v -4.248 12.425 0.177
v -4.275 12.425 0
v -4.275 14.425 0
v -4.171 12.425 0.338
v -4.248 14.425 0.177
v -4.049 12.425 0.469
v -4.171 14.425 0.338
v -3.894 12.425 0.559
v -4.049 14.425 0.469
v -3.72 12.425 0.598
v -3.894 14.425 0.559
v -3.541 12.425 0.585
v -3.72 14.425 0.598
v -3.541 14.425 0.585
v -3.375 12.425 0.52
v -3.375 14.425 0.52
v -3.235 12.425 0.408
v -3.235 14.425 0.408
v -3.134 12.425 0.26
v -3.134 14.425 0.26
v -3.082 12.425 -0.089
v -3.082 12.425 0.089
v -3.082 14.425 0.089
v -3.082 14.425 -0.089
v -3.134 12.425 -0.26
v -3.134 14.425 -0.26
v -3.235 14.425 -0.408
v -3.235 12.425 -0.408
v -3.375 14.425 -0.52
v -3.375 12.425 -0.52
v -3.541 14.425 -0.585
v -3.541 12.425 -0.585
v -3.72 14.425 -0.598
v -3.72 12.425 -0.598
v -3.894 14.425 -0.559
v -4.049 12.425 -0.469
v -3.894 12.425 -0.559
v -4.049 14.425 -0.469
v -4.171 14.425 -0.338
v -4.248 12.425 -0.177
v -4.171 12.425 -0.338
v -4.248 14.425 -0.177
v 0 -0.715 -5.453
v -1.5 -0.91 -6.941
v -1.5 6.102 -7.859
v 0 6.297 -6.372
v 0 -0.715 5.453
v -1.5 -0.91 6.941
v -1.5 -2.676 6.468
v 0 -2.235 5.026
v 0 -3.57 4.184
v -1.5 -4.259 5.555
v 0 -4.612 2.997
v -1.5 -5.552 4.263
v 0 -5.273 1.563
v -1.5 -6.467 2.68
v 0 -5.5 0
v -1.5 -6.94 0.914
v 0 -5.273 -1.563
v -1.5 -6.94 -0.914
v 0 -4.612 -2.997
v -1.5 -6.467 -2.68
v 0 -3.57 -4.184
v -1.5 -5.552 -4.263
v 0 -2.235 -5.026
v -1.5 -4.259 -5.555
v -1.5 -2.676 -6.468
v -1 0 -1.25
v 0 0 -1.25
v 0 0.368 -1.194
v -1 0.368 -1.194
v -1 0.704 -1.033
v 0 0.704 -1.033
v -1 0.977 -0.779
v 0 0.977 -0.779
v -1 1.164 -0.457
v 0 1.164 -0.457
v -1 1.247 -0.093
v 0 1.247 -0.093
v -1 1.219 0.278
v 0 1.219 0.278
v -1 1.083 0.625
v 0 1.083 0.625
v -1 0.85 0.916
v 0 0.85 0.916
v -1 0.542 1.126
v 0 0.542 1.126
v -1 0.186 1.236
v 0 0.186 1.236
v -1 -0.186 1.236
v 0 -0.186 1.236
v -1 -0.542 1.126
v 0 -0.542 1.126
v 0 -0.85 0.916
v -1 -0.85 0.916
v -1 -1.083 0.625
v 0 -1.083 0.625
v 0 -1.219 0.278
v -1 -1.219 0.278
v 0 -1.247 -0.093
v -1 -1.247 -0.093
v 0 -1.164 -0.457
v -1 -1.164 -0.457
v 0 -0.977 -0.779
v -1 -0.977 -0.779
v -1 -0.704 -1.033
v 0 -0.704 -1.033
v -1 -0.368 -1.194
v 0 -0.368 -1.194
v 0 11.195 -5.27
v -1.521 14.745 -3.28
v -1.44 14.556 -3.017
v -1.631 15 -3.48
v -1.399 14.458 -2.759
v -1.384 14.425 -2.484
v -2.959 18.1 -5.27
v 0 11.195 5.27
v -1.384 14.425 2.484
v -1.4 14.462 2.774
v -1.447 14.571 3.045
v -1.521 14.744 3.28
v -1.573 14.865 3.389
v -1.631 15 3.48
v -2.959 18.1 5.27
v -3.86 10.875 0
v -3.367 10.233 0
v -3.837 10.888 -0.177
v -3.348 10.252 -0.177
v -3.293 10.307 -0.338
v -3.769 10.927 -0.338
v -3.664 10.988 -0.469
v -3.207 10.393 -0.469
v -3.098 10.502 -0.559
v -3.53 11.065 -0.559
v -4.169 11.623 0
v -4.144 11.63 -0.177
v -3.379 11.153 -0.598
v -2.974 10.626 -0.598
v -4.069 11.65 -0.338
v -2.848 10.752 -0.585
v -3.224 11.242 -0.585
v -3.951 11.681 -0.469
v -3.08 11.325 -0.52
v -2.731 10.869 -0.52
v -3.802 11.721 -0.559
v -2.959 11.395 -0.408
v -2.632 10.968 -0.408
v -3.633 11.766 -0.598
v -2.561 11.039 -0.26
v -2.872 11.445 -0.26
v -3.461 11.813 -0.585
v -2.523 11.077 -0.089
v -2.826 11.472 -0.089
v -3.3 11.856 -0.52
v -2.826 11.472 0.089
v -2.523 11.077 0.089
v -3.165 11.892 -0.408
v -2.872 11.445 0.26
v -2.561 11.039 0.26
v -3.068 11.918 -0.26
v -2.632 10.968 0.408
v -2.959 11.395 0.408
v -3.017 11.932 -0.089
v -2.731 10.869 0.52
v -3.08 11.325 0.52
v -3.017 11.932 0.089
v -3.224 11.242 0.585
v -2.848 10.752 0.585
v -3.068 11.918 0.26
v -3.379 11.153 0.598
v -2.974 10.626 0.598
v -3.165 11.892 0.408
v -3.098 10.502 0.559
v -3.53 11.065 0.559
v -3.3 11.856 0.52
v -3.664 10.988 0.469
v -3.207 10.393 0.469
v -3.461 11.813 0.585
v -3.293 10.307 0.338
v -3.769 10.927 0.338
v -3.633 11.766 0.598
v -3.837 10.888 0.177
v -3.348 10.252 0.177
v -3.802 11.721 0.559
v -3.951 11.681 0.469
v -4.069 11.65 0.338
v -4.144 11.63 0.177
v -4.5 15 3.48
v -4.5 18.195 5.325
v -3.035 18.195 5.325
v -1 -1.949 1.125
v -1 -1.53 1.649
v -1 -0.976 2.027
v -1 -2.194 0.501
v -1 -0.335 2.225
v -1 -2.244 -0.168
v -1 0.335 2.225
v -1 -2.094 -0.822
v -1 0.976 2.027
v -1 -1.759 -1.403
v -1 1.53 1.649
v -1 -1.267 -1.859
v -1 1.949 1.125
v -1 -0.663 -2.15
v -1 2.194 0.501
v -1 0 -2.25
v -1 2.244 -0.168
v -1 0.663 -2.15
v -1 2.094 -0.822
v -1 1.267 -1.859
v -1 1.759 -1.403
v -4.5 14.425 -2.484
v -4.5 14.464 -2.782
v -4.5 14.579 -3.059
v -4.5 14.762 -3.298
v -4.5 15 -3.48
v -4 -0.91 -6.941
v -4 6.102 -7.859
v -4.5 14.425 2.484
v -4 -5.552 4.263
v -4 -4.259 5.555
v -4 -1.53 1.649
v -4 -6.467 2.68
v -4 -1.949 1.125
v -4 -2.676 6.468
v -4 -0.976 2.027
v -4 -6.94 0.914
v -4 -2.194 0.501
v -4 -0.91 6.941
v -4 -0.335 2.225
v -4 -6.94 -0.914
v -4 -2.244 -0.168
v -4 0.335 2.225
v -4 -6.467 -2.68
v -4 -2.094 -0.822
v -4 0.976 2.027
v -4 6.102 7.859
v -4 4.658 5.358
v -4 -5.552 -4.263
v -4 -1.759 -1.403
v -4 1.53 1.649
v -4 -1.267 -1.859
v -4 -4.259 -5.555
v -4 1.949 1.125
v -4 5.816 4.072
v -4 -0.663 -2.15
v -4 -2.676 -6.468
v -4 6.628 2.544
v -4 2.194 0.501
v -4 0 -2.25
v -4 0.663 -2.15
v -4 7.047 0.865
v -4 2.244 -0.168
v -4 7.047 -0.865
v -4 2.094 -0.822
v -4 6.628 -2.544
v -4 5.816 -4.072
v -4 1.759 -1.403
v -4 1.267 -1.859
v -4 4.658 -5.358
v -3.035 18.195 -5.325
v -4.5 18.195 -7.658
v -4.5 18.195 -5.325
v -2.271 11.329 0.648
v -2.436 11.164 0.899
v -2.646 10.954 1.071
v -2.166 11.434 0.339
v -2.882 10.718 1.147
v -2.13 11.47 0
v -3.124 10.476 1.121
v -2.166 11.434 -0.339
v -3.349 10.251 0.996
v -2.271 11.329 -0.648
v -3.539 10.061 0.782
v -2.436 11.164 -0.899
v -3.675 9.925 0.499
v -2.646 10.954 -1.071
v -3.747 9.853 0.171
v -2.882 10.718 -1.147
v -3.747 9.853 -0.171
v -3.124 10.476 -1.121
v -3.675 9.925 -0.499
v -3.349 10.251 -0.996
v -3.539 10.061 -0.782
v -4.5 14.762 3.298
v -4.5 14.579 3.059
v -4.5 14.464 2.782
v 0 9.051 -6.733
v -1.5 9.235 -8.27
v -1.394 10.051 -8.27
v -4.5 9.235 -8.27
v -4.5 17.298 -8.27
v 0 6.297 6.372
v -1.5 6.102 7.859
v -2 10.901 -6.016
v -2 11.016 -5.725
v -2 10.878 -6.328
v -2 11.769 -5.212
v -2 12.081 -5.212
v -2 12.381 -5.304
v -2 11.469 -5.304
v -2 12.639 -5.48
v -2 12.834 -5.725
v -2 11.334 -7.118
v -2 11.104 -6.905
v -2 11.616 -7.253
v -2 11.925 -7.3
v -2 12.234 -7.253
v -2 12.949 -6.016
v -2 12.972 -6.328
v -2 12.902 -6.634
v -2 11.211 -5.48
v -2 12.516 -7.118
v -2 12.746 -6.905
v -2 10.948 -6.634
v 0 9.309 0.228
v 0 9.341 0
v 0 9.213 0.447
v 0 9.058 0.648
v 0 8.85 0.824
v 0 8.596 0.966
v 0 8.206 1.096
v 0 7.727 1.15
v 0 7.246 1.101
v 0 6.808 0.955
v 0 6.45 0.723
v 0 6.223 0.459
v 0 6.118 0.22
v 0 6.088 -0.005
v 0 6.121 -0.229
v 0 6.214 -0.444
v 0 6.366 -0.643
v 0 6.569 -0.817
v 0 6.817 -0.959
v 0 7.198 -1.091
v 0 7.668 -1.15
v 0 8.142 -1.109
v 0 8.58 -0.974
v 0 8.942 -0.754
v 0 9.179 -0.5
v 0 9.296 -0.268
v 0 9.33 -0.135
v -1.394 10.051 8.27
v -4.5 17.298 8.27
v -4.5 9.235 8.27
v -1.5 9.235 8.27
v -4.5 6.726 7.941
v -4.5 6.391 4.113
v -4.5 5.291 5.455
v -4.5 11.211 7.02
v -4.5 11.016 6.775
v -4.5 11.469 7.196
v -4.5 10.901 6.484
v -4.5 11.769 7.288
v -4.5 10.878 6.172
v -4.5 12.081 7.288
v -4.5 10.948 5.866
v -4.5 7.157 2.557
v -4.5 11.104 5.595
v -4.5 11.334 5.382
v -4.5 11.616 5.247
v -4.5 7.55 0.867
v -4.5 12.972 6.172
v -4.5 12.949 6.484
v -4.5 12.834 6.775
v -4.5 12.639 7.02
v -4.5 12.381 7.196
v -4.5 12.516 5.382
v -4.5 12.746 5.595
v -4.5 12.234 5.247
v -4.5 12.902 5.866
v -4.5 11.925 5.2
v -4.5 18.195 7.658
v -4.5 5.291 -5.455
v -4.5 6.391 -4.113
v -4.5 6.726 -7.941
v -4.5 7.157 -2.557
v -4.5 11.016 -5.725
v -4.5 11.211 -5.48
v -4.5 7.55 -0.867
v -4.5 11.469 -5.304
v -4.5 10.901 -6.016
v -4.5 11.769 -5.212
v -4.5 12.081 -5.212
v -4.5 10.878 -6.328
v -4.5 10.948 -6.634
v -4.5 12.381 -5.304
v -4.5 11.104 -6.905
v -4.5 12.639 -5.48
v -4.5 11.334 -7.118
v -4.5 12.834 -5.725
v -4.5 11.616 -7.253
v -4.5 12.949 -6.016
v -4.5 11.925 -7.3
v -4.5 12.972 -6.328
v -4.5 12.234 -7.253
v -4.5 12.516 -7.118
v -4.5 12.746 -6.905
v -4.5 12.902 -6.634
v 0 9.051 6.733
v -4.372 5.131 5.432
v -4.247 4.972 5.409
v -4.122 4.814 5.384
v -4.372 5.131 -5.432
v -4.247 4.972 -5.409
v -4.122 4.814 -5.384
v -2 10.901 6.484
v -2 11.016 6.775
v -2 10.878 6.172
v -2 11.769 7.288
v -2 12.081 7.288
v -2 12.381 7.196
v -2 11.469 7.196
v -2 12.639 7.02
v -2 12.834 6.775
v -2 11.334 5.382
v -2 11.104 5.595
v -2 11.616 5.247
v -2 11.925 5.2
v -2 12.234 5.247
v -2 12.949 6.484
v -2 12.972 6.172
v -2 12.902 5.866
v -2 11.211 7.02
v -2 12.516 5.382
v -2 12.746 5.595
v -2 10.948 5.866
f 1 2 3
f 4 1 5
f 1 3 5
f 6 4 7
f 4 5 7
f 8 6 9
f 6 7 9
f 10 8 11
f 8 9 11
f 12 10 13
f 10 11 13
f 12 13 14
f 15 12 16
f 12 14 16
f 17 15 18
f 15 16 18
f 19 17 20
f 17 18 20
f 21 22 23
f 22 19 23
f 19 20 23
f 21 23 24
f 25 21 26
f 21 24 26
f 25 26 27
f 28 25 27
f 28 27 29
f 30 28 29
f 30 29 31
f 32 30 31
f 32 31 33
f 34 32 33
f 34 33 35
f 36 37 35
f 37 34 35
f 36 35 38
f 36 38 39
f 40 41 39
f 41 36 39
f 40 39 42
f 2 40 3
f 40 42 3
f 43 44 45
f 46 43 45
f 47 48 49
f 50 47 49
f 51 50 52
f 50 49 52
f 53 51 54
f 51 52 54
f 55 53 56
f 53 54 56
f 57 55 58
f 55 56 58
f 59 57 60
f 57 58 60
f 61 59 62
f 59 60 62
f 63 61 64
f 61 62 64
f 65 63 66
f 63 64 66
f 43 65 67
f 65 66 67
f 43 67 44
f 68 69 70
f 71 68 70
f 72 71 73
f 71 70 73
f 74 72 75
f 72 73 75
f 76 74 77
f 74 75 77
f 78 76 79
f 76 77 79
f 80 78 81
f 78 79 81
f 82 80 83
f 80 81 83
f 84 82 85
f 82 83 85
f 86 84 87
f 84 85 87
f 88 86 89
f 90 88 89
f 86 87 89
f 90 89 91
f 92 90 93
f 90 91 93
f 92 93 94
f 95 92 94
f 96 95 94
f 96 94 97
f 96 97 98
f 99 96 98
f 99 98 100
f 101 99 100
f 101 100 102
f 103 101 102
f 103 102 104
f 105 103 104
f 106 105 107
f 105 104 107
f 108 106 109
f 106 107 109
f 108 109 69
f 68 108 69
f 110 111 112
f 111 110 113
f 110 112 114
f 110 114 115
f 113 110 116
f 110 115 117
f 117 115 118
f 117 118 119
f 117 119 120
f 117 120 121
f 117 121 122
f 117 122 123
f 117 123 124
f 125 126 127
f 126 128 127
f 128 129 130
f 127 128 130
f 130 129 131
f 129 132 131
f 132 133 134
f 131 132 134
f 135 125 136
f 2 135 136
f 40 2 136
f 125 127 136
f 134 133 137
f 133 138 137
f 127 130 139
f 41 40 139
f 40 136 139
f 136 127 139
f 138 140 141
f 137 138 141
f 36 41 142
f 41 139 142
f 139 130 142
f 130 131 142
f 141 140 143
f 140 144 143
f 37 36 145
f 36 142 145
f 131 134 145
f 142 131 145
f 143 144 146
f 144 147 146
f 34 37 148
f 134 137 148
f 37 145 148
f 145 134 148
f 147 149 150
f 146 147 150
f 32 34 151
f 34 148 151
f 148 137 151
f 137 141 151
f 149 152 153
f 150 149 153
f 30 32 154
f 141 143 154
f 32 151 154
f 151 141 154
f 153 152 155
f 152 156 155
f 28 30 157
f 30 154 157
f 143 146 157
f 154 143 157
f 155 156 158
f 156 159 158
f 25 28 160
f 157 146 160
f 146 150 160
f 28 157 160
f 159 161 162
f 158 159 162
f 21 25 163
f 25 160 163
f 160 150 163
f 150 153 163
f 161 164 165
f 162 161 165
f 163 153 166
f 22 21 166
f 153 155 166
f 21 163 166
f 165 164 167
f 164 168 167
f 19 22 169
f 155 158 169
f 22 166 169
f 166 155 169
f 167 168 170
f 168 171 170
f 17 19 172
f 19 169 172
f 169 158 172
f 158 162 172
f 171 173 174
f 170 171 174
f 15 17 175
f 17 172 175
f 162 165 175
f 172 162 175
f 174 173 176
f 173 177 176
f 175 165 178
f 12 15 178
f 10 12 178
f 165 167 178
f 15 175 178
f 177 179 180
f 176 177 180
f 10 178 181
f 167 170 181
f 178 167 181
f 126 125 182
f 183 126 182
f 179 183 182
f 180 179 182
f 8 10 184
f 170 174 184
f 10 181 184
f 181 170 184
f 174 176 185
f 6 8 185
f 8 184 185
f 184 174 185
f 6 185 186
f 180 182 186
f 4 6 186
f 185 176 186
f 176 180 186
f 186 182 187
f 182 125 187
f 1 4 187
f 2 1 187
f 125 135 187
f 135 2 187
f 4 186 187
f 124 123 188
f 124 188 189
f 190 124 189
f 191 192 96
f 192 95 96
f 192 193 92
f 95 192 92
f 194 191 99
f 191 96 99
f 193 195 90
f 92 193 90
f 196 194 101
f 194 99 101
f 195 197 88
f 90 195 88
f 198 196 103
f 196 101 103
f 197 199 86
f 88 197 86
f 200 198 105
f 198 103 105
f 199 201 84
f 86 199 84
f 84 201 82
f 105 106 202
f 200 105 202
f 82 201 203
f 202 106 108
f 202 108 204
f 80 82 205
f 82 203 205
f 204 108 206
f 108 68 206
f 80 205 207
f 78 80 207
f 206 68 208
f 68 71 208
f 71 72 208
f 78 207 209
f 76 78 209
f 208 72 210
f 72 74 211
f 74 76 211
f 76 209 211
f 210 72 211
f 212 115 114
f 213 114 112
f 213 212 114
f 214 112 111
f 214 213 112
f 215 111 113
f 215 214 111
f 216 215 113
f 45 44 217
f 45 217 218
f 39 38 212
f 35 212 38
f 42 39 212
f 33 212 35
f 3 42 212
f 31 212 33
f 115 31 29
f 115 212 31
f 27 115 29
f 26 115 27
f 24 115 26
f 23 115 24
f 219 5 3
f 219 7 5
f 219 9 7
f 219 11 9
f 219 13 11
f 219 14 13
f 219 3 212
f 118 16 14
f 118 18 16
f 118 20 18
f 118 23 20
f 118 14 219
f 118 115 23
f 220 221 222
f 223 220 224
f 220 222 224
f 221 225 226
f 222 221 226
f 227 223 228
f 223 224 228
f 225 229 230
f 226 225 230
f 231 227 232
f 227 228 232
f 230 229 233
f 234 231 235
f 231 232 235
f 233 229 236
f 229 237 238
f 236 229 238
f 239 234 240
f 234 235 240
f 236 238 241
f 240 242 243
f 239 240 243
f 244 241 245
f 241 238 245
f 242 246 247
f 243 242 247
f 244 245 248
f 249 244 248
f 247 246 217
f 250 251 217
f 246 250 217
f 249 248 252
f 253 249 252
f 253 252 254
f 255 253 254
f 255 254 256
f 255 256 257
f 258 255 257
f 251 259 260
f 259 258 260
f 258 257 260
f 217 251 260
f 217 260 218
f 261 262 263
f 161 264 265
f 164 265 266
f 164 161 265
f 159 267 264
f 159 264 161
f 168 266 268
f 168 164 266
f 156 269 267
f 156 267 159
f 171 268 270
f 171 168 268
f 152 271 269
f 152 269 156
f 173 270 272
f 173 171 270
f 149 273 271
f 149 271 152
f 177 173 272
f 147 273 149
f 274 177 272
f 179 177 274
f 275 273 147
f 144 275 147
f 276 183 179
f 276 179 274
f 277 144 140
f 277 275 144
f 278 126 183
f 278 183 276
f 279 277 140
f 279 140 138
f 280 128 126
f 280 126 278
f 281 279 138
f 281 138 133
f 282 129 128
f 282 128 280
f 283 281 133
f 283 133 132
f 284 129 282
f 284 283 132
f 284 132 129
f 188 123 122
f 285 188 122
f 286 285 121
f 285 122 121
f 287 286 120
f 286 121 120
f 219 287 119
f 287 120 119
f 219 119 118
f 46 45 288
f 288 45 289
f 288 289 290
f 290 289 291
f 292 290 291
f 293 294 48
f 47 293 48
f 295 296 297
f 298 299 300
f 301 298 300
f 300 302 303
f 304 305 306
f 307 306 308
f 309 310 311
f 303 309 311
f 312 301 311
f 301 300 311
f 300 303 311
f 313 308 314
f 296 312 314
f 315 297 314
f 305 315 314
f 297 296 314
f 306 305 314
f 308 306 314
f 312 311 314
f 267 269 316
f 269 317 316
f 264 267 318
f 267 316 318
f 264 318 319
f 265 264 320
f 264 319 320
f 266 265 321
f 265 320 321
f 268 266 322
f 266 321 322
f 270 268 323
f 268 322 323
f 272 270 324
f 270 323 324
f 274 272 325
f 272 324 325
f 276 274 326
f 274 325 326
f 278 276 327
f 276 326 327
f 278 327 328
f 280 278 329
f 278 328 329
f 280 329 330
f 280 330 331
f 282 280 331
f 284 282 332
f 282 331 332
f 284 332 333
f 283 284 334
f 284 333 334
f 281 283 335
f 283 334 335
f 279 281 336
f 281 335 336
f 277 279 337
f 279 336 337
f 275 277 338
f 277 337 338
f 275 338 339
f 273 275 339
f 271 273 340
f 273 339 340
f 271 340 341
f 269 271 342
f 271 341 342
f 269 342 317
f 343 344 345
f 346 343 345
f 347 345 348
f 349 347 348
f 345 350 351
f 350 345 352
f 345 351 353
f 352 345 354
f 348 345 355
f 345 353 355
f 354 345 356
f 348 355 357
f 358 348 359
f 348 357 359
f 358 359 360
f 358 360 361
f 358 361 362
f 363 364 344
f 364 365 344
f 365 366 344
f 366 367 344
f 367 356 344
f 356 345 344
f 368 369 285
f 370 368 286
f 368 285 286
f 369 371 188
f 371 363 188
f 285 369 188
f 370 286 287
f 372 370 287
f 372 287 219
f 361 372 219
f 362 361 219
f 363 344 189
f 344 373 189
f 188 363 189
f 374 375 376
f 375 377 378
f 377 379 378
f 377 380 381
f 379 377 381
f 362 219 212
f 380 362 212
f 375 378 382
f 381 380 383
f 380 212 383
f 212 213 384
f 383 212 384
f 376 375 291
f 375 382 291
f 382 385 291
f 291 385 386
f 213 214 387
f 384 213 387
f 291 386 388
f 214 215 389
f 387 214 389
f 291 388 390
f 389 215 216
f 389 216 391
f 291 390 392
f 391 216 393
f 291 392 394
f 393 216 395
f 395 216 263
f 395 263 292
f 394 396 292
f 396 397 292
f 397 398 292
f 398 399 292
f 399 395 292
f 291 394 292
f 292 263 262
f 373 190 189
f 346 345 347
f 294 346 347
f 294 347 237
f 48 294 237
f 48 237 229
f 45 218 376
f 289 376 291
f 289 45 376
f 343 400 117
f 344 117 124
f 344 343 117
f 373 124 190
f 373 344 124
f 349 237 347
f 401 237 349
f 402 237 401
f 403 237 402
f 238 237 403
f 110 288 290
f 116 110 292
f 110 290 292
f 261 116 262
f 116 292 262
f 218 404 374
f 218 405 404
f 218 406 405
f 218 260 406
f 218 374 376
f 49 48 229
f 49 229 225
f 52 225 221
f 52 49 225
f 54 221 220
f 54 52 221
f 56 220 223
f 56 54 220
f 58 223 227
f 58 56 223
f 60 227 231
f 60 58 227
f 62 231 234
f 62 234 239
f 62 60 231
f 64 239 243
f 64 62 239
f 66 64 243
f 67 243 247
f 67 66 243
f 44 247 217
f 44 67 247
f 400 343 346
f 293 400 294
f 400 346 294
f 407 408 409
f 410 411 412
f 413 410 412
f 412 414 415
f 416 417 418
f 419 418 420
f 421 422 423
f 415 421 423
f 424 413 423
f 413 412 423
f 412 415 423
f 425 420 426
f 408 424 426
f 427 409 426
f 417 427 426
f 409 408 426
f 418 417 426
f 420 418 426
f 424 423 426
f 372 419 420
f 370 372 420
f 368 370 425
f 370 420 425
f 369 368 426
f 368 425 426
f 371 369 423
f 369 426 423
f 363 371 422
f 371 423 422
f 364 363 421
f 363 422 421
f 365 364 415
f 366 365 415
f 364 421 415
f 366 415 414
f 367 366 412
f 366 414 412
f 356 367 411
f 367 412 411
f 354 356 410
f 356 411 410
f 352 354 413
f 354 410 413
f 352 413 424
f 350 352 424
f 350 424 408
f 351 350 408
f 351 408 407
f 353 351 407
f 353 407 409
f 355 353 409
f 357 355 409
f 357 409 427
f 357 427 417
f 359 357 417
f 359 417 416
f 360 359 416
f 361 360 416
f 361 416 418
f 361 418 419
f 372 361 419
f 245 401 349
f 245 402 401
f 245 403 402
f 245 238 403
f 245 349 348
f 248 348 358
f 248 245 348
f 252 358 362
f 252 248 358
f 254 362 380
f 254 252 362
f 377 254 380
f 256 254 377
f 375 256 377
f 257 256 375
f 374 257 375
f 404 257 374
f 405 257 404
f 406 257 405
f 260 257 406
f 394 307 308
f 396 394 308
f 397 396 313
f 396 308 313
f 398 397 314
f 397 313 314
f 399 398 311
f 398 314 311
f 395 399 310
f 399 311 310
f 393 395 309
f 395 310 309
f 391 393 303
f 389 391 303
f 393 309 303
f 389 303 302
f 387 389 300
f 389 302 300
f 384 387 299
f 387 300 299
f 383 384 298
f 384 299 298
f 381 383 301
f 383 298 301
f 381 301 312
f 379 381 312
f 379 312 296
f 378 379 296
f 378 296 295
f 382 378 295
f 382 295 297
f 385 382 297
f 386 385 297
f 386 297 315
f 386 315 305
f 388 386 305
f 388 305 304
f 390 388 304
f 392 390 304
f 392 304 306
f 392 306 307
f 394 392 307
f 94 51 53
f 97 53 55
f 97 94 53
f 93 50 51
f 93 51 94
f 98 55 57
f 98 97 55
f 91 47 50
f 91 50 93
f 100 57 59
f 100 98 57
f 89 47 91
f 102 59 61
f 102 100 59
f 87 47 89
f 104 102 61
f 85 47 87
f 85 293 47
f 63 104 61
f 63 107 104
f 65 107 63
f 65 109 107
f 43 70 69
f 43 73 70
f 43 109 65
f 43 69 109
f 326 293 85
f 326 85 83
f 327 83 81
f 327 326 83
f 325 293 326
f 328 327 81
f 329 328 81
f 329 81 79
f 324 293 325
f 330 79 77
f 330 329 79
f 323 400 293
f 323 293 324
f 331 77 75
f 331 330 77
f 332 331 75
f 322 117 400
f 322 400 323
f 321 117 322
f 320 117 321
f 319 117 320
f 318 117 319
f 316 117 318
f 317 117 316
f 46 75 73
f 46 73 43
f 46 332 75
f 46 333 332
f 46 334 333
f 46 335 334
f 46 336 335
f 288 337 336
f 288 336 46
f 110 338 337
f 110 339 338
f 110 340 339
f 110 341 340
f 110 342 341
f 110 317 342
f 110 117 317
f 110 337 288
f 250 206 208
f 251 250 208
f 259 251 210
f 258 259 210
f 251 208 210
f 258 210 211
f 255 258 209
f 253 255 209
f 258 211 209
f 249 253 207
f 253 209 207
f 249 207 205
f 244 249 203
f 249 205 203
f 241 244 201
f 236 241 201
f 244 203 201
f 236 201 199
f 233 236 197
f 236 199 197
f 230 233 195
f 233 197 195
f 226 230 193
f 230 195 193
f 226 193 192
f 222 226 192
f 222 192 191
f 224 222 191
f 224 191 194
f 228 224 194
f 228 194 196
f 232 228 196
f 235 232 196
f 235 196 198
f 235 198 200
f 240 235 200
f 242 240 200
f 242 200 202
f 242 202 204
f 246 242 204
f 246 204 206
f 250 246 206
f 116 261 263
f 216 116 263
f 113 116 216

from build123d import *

# Parameters (mm, degrees)
BOSS_EXTRUDE4_DEPTH  = 4.5
SKETCH1_R            = 2.25
BOSS_EXTRUDE1_DEPTH  = 4
SKETCH1_4_R          = 2.25
SKETCH1_4_R_2        = 1.25
BOSS_EXTRUDE2_DEPTH  = 1
CHAMFER1_SIZE        = 3
CHAMFER1_SIZE_2      = 5.196152423
FILLET1_R            = 1.15
CHAMFER2_SIZE        = 7
CHAMFER2_SIZE2       = 3
CHAMFER3_SIZE        = 3
CHAMFER3_SIZE2       = 1.732050808
CHAMFER4_SIZE        = 1.5
CUT_EXTRUDE1_START   = -2
SKETCH1_6_R          = 1.05
CUT_EXTRUDE1_DEPTH   = 19.48660355
CUT_SWEEP1_PROFILE_R = 0.6
CUT_SWEEP2_PROFILE_R = 1.15
CHAMFER5_SIZE        = 0.5


# Some blends are built 0.0001 mm under size
with BuildPart() as part:
    # Sketch1<7> → Boss-Extrude4 (new body)
    with BuildSketch(Plane(origin=(0, 0, 0), x_dir=(0, 0, -1), z_dir=(1, 0, 0))):
        with BuildLine():
            Line((8.27, 9.234757272), (8.27, 18.195))
            Line((8.27, 18.195), (2.325, 18.195))
            Line((2.325, 18.195), (2.325, 14.425))
            Line((2.325, 14.425), (-2.325, 14.425))
            Line((-2.325, 14.425), (-2.325, 18.195))
            Line((-2.325, 18.195), (-8.27, 18.195))
            Line((-8.27, 18.195), (-8.27, 9.234757272))
            Line((-8.27, 9.234757272), (-7.859471067, 6.101983066))
            Line((-7.859471067, 6.101983066), (-5.358442733, 4.658013684))
            ThreePointArc((-5.358442733, 4.658013684), (0, 7.1), (5.358442733, 4.658013684))
            Line((5.358442733, 4.658013684), (7.859471067, 6.101983066))
            Line((7.859471067, 6.101983066), (8.27, 9.234757272))
        make_face()
    extrude(amount=-BOSS_EXTRUDE4_DEPTH)

    # Sketch1 → Boss-Extrude1 (add)
    with BuildSketch(Plane(origin=(0, 0, 0), x_dir=(0, 0, -1), z_dir=(1, 0, 0))):
        with BuildLine():
            Line((6.940659998, -0.909526687), (7.859471067, 6.101983066))
            Line((7.859471067, 6.101983066), (5.358442733, 4.658013684))
            ThreePointArc((5.358442733, 4.658013684), (0, 7.1), (-5.358442733, 4.658013684))
            Line((-5.358442733, 4.658013684), (-7.859471067, 6.101983066))
            Line((-7.859471067, 6.101983066), (-6.940659998, -0.909526687))
            ThreePointArc((-6.940659998, -0.909526687), (0, -7), (6.940659998, -0.909526687))
        make_face()
        Circle(SKETCH1_R, mode=Mode.SUBTRACT)
    extrude(amount=-BOSS_EXTRUDE1_DEPTH)

    # Sketch1<4> → Boss-Extrude2 (add)
    with BuildSketch(Plane(origin=(0, 0, 0), x_dir=(0, 0, -1), z_dir=(1, 0, 0))):
        Circle(SKETCH1_4_R)
        Circle(SKETCH1_4_R_2, mode=Mode.SUBTRACT)
    extrude(amount=-BOSS_EXTRUDE2_DEPTH)

    # Chamfer1
    # the kernel refuses this chamfer: 5.196152423, 3 mm, written as the material it takes off along each edge
    with BuildSketch(Plane(origin=(13.442891912, 18.195, -2.325), x_dir=(0, 0.057893862402672046, -0.9983227437537926), z_dir=(-1, 0, 0))) as chamfer1_piece_1_section:
        Polygon((CHAMFER1_SIZE * 0.998322743754, CHAMFER1_SIZE * 0.0578938624027), (-CHAMFER1_SIZE_2 * 0.0578938623994, CHAMFER1_SIZE_2 * 0.998322743697), (0, 0), align=None)
    chamfer1_piece_1 = extrude(amount=31.385783824, mode=Mode.PRIVATE)
    chamfer1_piece_1 = split(chamfer1_piece_1, bisect_by=Plane(origin=(-2.25, 14.425, -3.37149022), z_dir=(0, 1, 0)), keep=Keep.TOP, mode=Mode.PRIVATE)
    add(chamfer1_piece_1, mode=Mode.SUBTRACT)
    with BuildSketch(Plane(origin=(13.442891912, 18.195, 2.325), x_dir=(0, -0.9998132206222079, -0.019326765612700594), z_dir=(-1, 0, 0))) as chamfer1_piece_2_section:
        Polygon((CHAMFER1_SIZE_2 * 0.999813220566, CHAMFER1_SIZE_2 * 0.0193267656116), (-CHAMFER1_SIZE * 0.0193267656127, CHAMFER1_SIZE * 0.999813220622), (0, 0), align=None)
    chamfer1_piece_2 = extrude(amount=31.385783824, mode=Mode.PRIVATE)
    chamfer1_piece_2 = split(chamfer1_piece_2, bisect_by=Plane(origin=(-2.25, 14.425, 3.37149022), z_dir=(0, 1, 0)), keep=Keep.TOP, mode=Mode.PRIVATE)
    add(chamfer1_piece_2, mode=Mode.SUBTRACT)

    # Fillet1
    fillet1_edges = [part.edges().sort_by_distance(p)[0] for p in [
        (-2.25, 14.425, -3.148389485),
        (-2.25, 14.425, 3.148389485),
    ]]
    fillet(fillet1_edges, radius=FILLET1_R)

    # Chamfer2
    chamfer2_edges = [part.edges().sort_by_distance(p)[0] for p in [
        (0, 18.195, 6.7975),
    ]]
    chamfer2_side = [part.faces().sort_by_distance(p)[0] for p in [
        (0, 5.909970068, 0),
    ]]
    chamfer(chamfer2_edges, length=CHAMFER2_SIZE, length2=CHAMFER2_SIZE2, reference=chamfer2_side[0])

    # Chamfer3
    chamfer3_edges = [part.edges().sort_by_distance(p)[0] for p in [
        (-1.5, 14.695, -8.27),
        (-1.5, 14.695, 8.27),
    ]]
    chamfer3_side = [part.faces().sort_by_distance(p)[0] for p in [
        (-1.210290333, 14.019010778, 0),
    ]]
    chamfer(chamfer3_edges, length=CHAMFER3_SIZE, length2=CHAMFER3_SIZE2, reference=chamfer3_side[0])

    # Chamfer4
    chamfer4_edges = [part.edges().sort_by_distance(p)[0] for p in [
        (0, 3.140553901, 7.471395746),
        (0, 3.140553901, -7.471395746),
        (0, -7, 0),
    ]]
    chamfer(chamfer4_edges, length=CHAMFER4_SIZE)

    # Sketch1<6> → Cut-Extrude1 (cut, through all)
    with BuildSketch(Plane(origin=(0, 0, 0), x_dir=(0, 0, -1), z_dir=(1, 0, 0)).offset(CUT_EXTRUDE1_START)):
        with Locations((6.25, 11.925)):
            Circle(SKETCH1_6_R)
        with Locations((-6.25, 11.925)):
            Circle(SKETCH1_6_R)
    extrude(amount=-CUT_EXTRUDE1_DEPTH, mode=Mode.SUBTRACT)

    # Cut-Sweep1: sweep along a path in Sketch2
    with BuildLine(Plane.XY) as cut_sweep1_path:
        Line((4.128300859, 3.586165235), (-2.942766953, 10.657233047))
        ThreePointArc((-2.942766953, 10.657233047), (-3.484698831, 11.468291419), (-3.675, 12.425))
        Line((-3.675, 12.425), (-3.675, 14.425))
    # Cut-Sweep1 profile (on start of the path) → Cut-Sweep1 (sweep, cut)
    with BuildSketch(Plane(origin=(4.128300859, 3.586165235, 0), x_dir=(-0.7071067811865461, -0.707106781186549, 0), z_dir=(-0.707106781186549, 0.7071067811865461, 0))):
        Circle(CUT_SWEEP1_PROFILE_R)
    sweep(path=cut_sweep1_path.line, mode=Mode.SUBTRACT)

    # Cut-Sweep2: sweep along a path in Sketch2<3>
    with BuildLine(Plane.XY) as cut_sweep2_path:
        Line((-2.942766953, 10.657233047), (4.128300859, 3.586165235))
    # Cut-Sweep2 profile (on start of the path) → Cut-Sweep2 (sweep, cut)
    with BuildSketch(Plane(origin=(-2.942766953, 10.657233047, 0), x_dir=(0.7071067811865461, 0.707106781186549, 0), z_dir=(0.707106781186549, -0.7071067811865461, 0))):
        Circle(CUT_SWEEP2_PROFILE_R)
    sweep(path=cut_sweep2_path.line, mode=Mode.SUBTRACT)

    # Chamfer5
    chamfer5_edges = [part.edges().sort_by_distance(p)[0] for p in [
        (-4.5, 5.379998375, -6.6089569),
        (-4.5, 7.1, 0),
        (-4.5, 5.379998375, 6.6089569),
    ]]
    chamfer(chamfer5_edges, length=CHAMFER5_SIZE - 0.0001)  # a hair under: the kernel refuses the full size


solid = part.part
